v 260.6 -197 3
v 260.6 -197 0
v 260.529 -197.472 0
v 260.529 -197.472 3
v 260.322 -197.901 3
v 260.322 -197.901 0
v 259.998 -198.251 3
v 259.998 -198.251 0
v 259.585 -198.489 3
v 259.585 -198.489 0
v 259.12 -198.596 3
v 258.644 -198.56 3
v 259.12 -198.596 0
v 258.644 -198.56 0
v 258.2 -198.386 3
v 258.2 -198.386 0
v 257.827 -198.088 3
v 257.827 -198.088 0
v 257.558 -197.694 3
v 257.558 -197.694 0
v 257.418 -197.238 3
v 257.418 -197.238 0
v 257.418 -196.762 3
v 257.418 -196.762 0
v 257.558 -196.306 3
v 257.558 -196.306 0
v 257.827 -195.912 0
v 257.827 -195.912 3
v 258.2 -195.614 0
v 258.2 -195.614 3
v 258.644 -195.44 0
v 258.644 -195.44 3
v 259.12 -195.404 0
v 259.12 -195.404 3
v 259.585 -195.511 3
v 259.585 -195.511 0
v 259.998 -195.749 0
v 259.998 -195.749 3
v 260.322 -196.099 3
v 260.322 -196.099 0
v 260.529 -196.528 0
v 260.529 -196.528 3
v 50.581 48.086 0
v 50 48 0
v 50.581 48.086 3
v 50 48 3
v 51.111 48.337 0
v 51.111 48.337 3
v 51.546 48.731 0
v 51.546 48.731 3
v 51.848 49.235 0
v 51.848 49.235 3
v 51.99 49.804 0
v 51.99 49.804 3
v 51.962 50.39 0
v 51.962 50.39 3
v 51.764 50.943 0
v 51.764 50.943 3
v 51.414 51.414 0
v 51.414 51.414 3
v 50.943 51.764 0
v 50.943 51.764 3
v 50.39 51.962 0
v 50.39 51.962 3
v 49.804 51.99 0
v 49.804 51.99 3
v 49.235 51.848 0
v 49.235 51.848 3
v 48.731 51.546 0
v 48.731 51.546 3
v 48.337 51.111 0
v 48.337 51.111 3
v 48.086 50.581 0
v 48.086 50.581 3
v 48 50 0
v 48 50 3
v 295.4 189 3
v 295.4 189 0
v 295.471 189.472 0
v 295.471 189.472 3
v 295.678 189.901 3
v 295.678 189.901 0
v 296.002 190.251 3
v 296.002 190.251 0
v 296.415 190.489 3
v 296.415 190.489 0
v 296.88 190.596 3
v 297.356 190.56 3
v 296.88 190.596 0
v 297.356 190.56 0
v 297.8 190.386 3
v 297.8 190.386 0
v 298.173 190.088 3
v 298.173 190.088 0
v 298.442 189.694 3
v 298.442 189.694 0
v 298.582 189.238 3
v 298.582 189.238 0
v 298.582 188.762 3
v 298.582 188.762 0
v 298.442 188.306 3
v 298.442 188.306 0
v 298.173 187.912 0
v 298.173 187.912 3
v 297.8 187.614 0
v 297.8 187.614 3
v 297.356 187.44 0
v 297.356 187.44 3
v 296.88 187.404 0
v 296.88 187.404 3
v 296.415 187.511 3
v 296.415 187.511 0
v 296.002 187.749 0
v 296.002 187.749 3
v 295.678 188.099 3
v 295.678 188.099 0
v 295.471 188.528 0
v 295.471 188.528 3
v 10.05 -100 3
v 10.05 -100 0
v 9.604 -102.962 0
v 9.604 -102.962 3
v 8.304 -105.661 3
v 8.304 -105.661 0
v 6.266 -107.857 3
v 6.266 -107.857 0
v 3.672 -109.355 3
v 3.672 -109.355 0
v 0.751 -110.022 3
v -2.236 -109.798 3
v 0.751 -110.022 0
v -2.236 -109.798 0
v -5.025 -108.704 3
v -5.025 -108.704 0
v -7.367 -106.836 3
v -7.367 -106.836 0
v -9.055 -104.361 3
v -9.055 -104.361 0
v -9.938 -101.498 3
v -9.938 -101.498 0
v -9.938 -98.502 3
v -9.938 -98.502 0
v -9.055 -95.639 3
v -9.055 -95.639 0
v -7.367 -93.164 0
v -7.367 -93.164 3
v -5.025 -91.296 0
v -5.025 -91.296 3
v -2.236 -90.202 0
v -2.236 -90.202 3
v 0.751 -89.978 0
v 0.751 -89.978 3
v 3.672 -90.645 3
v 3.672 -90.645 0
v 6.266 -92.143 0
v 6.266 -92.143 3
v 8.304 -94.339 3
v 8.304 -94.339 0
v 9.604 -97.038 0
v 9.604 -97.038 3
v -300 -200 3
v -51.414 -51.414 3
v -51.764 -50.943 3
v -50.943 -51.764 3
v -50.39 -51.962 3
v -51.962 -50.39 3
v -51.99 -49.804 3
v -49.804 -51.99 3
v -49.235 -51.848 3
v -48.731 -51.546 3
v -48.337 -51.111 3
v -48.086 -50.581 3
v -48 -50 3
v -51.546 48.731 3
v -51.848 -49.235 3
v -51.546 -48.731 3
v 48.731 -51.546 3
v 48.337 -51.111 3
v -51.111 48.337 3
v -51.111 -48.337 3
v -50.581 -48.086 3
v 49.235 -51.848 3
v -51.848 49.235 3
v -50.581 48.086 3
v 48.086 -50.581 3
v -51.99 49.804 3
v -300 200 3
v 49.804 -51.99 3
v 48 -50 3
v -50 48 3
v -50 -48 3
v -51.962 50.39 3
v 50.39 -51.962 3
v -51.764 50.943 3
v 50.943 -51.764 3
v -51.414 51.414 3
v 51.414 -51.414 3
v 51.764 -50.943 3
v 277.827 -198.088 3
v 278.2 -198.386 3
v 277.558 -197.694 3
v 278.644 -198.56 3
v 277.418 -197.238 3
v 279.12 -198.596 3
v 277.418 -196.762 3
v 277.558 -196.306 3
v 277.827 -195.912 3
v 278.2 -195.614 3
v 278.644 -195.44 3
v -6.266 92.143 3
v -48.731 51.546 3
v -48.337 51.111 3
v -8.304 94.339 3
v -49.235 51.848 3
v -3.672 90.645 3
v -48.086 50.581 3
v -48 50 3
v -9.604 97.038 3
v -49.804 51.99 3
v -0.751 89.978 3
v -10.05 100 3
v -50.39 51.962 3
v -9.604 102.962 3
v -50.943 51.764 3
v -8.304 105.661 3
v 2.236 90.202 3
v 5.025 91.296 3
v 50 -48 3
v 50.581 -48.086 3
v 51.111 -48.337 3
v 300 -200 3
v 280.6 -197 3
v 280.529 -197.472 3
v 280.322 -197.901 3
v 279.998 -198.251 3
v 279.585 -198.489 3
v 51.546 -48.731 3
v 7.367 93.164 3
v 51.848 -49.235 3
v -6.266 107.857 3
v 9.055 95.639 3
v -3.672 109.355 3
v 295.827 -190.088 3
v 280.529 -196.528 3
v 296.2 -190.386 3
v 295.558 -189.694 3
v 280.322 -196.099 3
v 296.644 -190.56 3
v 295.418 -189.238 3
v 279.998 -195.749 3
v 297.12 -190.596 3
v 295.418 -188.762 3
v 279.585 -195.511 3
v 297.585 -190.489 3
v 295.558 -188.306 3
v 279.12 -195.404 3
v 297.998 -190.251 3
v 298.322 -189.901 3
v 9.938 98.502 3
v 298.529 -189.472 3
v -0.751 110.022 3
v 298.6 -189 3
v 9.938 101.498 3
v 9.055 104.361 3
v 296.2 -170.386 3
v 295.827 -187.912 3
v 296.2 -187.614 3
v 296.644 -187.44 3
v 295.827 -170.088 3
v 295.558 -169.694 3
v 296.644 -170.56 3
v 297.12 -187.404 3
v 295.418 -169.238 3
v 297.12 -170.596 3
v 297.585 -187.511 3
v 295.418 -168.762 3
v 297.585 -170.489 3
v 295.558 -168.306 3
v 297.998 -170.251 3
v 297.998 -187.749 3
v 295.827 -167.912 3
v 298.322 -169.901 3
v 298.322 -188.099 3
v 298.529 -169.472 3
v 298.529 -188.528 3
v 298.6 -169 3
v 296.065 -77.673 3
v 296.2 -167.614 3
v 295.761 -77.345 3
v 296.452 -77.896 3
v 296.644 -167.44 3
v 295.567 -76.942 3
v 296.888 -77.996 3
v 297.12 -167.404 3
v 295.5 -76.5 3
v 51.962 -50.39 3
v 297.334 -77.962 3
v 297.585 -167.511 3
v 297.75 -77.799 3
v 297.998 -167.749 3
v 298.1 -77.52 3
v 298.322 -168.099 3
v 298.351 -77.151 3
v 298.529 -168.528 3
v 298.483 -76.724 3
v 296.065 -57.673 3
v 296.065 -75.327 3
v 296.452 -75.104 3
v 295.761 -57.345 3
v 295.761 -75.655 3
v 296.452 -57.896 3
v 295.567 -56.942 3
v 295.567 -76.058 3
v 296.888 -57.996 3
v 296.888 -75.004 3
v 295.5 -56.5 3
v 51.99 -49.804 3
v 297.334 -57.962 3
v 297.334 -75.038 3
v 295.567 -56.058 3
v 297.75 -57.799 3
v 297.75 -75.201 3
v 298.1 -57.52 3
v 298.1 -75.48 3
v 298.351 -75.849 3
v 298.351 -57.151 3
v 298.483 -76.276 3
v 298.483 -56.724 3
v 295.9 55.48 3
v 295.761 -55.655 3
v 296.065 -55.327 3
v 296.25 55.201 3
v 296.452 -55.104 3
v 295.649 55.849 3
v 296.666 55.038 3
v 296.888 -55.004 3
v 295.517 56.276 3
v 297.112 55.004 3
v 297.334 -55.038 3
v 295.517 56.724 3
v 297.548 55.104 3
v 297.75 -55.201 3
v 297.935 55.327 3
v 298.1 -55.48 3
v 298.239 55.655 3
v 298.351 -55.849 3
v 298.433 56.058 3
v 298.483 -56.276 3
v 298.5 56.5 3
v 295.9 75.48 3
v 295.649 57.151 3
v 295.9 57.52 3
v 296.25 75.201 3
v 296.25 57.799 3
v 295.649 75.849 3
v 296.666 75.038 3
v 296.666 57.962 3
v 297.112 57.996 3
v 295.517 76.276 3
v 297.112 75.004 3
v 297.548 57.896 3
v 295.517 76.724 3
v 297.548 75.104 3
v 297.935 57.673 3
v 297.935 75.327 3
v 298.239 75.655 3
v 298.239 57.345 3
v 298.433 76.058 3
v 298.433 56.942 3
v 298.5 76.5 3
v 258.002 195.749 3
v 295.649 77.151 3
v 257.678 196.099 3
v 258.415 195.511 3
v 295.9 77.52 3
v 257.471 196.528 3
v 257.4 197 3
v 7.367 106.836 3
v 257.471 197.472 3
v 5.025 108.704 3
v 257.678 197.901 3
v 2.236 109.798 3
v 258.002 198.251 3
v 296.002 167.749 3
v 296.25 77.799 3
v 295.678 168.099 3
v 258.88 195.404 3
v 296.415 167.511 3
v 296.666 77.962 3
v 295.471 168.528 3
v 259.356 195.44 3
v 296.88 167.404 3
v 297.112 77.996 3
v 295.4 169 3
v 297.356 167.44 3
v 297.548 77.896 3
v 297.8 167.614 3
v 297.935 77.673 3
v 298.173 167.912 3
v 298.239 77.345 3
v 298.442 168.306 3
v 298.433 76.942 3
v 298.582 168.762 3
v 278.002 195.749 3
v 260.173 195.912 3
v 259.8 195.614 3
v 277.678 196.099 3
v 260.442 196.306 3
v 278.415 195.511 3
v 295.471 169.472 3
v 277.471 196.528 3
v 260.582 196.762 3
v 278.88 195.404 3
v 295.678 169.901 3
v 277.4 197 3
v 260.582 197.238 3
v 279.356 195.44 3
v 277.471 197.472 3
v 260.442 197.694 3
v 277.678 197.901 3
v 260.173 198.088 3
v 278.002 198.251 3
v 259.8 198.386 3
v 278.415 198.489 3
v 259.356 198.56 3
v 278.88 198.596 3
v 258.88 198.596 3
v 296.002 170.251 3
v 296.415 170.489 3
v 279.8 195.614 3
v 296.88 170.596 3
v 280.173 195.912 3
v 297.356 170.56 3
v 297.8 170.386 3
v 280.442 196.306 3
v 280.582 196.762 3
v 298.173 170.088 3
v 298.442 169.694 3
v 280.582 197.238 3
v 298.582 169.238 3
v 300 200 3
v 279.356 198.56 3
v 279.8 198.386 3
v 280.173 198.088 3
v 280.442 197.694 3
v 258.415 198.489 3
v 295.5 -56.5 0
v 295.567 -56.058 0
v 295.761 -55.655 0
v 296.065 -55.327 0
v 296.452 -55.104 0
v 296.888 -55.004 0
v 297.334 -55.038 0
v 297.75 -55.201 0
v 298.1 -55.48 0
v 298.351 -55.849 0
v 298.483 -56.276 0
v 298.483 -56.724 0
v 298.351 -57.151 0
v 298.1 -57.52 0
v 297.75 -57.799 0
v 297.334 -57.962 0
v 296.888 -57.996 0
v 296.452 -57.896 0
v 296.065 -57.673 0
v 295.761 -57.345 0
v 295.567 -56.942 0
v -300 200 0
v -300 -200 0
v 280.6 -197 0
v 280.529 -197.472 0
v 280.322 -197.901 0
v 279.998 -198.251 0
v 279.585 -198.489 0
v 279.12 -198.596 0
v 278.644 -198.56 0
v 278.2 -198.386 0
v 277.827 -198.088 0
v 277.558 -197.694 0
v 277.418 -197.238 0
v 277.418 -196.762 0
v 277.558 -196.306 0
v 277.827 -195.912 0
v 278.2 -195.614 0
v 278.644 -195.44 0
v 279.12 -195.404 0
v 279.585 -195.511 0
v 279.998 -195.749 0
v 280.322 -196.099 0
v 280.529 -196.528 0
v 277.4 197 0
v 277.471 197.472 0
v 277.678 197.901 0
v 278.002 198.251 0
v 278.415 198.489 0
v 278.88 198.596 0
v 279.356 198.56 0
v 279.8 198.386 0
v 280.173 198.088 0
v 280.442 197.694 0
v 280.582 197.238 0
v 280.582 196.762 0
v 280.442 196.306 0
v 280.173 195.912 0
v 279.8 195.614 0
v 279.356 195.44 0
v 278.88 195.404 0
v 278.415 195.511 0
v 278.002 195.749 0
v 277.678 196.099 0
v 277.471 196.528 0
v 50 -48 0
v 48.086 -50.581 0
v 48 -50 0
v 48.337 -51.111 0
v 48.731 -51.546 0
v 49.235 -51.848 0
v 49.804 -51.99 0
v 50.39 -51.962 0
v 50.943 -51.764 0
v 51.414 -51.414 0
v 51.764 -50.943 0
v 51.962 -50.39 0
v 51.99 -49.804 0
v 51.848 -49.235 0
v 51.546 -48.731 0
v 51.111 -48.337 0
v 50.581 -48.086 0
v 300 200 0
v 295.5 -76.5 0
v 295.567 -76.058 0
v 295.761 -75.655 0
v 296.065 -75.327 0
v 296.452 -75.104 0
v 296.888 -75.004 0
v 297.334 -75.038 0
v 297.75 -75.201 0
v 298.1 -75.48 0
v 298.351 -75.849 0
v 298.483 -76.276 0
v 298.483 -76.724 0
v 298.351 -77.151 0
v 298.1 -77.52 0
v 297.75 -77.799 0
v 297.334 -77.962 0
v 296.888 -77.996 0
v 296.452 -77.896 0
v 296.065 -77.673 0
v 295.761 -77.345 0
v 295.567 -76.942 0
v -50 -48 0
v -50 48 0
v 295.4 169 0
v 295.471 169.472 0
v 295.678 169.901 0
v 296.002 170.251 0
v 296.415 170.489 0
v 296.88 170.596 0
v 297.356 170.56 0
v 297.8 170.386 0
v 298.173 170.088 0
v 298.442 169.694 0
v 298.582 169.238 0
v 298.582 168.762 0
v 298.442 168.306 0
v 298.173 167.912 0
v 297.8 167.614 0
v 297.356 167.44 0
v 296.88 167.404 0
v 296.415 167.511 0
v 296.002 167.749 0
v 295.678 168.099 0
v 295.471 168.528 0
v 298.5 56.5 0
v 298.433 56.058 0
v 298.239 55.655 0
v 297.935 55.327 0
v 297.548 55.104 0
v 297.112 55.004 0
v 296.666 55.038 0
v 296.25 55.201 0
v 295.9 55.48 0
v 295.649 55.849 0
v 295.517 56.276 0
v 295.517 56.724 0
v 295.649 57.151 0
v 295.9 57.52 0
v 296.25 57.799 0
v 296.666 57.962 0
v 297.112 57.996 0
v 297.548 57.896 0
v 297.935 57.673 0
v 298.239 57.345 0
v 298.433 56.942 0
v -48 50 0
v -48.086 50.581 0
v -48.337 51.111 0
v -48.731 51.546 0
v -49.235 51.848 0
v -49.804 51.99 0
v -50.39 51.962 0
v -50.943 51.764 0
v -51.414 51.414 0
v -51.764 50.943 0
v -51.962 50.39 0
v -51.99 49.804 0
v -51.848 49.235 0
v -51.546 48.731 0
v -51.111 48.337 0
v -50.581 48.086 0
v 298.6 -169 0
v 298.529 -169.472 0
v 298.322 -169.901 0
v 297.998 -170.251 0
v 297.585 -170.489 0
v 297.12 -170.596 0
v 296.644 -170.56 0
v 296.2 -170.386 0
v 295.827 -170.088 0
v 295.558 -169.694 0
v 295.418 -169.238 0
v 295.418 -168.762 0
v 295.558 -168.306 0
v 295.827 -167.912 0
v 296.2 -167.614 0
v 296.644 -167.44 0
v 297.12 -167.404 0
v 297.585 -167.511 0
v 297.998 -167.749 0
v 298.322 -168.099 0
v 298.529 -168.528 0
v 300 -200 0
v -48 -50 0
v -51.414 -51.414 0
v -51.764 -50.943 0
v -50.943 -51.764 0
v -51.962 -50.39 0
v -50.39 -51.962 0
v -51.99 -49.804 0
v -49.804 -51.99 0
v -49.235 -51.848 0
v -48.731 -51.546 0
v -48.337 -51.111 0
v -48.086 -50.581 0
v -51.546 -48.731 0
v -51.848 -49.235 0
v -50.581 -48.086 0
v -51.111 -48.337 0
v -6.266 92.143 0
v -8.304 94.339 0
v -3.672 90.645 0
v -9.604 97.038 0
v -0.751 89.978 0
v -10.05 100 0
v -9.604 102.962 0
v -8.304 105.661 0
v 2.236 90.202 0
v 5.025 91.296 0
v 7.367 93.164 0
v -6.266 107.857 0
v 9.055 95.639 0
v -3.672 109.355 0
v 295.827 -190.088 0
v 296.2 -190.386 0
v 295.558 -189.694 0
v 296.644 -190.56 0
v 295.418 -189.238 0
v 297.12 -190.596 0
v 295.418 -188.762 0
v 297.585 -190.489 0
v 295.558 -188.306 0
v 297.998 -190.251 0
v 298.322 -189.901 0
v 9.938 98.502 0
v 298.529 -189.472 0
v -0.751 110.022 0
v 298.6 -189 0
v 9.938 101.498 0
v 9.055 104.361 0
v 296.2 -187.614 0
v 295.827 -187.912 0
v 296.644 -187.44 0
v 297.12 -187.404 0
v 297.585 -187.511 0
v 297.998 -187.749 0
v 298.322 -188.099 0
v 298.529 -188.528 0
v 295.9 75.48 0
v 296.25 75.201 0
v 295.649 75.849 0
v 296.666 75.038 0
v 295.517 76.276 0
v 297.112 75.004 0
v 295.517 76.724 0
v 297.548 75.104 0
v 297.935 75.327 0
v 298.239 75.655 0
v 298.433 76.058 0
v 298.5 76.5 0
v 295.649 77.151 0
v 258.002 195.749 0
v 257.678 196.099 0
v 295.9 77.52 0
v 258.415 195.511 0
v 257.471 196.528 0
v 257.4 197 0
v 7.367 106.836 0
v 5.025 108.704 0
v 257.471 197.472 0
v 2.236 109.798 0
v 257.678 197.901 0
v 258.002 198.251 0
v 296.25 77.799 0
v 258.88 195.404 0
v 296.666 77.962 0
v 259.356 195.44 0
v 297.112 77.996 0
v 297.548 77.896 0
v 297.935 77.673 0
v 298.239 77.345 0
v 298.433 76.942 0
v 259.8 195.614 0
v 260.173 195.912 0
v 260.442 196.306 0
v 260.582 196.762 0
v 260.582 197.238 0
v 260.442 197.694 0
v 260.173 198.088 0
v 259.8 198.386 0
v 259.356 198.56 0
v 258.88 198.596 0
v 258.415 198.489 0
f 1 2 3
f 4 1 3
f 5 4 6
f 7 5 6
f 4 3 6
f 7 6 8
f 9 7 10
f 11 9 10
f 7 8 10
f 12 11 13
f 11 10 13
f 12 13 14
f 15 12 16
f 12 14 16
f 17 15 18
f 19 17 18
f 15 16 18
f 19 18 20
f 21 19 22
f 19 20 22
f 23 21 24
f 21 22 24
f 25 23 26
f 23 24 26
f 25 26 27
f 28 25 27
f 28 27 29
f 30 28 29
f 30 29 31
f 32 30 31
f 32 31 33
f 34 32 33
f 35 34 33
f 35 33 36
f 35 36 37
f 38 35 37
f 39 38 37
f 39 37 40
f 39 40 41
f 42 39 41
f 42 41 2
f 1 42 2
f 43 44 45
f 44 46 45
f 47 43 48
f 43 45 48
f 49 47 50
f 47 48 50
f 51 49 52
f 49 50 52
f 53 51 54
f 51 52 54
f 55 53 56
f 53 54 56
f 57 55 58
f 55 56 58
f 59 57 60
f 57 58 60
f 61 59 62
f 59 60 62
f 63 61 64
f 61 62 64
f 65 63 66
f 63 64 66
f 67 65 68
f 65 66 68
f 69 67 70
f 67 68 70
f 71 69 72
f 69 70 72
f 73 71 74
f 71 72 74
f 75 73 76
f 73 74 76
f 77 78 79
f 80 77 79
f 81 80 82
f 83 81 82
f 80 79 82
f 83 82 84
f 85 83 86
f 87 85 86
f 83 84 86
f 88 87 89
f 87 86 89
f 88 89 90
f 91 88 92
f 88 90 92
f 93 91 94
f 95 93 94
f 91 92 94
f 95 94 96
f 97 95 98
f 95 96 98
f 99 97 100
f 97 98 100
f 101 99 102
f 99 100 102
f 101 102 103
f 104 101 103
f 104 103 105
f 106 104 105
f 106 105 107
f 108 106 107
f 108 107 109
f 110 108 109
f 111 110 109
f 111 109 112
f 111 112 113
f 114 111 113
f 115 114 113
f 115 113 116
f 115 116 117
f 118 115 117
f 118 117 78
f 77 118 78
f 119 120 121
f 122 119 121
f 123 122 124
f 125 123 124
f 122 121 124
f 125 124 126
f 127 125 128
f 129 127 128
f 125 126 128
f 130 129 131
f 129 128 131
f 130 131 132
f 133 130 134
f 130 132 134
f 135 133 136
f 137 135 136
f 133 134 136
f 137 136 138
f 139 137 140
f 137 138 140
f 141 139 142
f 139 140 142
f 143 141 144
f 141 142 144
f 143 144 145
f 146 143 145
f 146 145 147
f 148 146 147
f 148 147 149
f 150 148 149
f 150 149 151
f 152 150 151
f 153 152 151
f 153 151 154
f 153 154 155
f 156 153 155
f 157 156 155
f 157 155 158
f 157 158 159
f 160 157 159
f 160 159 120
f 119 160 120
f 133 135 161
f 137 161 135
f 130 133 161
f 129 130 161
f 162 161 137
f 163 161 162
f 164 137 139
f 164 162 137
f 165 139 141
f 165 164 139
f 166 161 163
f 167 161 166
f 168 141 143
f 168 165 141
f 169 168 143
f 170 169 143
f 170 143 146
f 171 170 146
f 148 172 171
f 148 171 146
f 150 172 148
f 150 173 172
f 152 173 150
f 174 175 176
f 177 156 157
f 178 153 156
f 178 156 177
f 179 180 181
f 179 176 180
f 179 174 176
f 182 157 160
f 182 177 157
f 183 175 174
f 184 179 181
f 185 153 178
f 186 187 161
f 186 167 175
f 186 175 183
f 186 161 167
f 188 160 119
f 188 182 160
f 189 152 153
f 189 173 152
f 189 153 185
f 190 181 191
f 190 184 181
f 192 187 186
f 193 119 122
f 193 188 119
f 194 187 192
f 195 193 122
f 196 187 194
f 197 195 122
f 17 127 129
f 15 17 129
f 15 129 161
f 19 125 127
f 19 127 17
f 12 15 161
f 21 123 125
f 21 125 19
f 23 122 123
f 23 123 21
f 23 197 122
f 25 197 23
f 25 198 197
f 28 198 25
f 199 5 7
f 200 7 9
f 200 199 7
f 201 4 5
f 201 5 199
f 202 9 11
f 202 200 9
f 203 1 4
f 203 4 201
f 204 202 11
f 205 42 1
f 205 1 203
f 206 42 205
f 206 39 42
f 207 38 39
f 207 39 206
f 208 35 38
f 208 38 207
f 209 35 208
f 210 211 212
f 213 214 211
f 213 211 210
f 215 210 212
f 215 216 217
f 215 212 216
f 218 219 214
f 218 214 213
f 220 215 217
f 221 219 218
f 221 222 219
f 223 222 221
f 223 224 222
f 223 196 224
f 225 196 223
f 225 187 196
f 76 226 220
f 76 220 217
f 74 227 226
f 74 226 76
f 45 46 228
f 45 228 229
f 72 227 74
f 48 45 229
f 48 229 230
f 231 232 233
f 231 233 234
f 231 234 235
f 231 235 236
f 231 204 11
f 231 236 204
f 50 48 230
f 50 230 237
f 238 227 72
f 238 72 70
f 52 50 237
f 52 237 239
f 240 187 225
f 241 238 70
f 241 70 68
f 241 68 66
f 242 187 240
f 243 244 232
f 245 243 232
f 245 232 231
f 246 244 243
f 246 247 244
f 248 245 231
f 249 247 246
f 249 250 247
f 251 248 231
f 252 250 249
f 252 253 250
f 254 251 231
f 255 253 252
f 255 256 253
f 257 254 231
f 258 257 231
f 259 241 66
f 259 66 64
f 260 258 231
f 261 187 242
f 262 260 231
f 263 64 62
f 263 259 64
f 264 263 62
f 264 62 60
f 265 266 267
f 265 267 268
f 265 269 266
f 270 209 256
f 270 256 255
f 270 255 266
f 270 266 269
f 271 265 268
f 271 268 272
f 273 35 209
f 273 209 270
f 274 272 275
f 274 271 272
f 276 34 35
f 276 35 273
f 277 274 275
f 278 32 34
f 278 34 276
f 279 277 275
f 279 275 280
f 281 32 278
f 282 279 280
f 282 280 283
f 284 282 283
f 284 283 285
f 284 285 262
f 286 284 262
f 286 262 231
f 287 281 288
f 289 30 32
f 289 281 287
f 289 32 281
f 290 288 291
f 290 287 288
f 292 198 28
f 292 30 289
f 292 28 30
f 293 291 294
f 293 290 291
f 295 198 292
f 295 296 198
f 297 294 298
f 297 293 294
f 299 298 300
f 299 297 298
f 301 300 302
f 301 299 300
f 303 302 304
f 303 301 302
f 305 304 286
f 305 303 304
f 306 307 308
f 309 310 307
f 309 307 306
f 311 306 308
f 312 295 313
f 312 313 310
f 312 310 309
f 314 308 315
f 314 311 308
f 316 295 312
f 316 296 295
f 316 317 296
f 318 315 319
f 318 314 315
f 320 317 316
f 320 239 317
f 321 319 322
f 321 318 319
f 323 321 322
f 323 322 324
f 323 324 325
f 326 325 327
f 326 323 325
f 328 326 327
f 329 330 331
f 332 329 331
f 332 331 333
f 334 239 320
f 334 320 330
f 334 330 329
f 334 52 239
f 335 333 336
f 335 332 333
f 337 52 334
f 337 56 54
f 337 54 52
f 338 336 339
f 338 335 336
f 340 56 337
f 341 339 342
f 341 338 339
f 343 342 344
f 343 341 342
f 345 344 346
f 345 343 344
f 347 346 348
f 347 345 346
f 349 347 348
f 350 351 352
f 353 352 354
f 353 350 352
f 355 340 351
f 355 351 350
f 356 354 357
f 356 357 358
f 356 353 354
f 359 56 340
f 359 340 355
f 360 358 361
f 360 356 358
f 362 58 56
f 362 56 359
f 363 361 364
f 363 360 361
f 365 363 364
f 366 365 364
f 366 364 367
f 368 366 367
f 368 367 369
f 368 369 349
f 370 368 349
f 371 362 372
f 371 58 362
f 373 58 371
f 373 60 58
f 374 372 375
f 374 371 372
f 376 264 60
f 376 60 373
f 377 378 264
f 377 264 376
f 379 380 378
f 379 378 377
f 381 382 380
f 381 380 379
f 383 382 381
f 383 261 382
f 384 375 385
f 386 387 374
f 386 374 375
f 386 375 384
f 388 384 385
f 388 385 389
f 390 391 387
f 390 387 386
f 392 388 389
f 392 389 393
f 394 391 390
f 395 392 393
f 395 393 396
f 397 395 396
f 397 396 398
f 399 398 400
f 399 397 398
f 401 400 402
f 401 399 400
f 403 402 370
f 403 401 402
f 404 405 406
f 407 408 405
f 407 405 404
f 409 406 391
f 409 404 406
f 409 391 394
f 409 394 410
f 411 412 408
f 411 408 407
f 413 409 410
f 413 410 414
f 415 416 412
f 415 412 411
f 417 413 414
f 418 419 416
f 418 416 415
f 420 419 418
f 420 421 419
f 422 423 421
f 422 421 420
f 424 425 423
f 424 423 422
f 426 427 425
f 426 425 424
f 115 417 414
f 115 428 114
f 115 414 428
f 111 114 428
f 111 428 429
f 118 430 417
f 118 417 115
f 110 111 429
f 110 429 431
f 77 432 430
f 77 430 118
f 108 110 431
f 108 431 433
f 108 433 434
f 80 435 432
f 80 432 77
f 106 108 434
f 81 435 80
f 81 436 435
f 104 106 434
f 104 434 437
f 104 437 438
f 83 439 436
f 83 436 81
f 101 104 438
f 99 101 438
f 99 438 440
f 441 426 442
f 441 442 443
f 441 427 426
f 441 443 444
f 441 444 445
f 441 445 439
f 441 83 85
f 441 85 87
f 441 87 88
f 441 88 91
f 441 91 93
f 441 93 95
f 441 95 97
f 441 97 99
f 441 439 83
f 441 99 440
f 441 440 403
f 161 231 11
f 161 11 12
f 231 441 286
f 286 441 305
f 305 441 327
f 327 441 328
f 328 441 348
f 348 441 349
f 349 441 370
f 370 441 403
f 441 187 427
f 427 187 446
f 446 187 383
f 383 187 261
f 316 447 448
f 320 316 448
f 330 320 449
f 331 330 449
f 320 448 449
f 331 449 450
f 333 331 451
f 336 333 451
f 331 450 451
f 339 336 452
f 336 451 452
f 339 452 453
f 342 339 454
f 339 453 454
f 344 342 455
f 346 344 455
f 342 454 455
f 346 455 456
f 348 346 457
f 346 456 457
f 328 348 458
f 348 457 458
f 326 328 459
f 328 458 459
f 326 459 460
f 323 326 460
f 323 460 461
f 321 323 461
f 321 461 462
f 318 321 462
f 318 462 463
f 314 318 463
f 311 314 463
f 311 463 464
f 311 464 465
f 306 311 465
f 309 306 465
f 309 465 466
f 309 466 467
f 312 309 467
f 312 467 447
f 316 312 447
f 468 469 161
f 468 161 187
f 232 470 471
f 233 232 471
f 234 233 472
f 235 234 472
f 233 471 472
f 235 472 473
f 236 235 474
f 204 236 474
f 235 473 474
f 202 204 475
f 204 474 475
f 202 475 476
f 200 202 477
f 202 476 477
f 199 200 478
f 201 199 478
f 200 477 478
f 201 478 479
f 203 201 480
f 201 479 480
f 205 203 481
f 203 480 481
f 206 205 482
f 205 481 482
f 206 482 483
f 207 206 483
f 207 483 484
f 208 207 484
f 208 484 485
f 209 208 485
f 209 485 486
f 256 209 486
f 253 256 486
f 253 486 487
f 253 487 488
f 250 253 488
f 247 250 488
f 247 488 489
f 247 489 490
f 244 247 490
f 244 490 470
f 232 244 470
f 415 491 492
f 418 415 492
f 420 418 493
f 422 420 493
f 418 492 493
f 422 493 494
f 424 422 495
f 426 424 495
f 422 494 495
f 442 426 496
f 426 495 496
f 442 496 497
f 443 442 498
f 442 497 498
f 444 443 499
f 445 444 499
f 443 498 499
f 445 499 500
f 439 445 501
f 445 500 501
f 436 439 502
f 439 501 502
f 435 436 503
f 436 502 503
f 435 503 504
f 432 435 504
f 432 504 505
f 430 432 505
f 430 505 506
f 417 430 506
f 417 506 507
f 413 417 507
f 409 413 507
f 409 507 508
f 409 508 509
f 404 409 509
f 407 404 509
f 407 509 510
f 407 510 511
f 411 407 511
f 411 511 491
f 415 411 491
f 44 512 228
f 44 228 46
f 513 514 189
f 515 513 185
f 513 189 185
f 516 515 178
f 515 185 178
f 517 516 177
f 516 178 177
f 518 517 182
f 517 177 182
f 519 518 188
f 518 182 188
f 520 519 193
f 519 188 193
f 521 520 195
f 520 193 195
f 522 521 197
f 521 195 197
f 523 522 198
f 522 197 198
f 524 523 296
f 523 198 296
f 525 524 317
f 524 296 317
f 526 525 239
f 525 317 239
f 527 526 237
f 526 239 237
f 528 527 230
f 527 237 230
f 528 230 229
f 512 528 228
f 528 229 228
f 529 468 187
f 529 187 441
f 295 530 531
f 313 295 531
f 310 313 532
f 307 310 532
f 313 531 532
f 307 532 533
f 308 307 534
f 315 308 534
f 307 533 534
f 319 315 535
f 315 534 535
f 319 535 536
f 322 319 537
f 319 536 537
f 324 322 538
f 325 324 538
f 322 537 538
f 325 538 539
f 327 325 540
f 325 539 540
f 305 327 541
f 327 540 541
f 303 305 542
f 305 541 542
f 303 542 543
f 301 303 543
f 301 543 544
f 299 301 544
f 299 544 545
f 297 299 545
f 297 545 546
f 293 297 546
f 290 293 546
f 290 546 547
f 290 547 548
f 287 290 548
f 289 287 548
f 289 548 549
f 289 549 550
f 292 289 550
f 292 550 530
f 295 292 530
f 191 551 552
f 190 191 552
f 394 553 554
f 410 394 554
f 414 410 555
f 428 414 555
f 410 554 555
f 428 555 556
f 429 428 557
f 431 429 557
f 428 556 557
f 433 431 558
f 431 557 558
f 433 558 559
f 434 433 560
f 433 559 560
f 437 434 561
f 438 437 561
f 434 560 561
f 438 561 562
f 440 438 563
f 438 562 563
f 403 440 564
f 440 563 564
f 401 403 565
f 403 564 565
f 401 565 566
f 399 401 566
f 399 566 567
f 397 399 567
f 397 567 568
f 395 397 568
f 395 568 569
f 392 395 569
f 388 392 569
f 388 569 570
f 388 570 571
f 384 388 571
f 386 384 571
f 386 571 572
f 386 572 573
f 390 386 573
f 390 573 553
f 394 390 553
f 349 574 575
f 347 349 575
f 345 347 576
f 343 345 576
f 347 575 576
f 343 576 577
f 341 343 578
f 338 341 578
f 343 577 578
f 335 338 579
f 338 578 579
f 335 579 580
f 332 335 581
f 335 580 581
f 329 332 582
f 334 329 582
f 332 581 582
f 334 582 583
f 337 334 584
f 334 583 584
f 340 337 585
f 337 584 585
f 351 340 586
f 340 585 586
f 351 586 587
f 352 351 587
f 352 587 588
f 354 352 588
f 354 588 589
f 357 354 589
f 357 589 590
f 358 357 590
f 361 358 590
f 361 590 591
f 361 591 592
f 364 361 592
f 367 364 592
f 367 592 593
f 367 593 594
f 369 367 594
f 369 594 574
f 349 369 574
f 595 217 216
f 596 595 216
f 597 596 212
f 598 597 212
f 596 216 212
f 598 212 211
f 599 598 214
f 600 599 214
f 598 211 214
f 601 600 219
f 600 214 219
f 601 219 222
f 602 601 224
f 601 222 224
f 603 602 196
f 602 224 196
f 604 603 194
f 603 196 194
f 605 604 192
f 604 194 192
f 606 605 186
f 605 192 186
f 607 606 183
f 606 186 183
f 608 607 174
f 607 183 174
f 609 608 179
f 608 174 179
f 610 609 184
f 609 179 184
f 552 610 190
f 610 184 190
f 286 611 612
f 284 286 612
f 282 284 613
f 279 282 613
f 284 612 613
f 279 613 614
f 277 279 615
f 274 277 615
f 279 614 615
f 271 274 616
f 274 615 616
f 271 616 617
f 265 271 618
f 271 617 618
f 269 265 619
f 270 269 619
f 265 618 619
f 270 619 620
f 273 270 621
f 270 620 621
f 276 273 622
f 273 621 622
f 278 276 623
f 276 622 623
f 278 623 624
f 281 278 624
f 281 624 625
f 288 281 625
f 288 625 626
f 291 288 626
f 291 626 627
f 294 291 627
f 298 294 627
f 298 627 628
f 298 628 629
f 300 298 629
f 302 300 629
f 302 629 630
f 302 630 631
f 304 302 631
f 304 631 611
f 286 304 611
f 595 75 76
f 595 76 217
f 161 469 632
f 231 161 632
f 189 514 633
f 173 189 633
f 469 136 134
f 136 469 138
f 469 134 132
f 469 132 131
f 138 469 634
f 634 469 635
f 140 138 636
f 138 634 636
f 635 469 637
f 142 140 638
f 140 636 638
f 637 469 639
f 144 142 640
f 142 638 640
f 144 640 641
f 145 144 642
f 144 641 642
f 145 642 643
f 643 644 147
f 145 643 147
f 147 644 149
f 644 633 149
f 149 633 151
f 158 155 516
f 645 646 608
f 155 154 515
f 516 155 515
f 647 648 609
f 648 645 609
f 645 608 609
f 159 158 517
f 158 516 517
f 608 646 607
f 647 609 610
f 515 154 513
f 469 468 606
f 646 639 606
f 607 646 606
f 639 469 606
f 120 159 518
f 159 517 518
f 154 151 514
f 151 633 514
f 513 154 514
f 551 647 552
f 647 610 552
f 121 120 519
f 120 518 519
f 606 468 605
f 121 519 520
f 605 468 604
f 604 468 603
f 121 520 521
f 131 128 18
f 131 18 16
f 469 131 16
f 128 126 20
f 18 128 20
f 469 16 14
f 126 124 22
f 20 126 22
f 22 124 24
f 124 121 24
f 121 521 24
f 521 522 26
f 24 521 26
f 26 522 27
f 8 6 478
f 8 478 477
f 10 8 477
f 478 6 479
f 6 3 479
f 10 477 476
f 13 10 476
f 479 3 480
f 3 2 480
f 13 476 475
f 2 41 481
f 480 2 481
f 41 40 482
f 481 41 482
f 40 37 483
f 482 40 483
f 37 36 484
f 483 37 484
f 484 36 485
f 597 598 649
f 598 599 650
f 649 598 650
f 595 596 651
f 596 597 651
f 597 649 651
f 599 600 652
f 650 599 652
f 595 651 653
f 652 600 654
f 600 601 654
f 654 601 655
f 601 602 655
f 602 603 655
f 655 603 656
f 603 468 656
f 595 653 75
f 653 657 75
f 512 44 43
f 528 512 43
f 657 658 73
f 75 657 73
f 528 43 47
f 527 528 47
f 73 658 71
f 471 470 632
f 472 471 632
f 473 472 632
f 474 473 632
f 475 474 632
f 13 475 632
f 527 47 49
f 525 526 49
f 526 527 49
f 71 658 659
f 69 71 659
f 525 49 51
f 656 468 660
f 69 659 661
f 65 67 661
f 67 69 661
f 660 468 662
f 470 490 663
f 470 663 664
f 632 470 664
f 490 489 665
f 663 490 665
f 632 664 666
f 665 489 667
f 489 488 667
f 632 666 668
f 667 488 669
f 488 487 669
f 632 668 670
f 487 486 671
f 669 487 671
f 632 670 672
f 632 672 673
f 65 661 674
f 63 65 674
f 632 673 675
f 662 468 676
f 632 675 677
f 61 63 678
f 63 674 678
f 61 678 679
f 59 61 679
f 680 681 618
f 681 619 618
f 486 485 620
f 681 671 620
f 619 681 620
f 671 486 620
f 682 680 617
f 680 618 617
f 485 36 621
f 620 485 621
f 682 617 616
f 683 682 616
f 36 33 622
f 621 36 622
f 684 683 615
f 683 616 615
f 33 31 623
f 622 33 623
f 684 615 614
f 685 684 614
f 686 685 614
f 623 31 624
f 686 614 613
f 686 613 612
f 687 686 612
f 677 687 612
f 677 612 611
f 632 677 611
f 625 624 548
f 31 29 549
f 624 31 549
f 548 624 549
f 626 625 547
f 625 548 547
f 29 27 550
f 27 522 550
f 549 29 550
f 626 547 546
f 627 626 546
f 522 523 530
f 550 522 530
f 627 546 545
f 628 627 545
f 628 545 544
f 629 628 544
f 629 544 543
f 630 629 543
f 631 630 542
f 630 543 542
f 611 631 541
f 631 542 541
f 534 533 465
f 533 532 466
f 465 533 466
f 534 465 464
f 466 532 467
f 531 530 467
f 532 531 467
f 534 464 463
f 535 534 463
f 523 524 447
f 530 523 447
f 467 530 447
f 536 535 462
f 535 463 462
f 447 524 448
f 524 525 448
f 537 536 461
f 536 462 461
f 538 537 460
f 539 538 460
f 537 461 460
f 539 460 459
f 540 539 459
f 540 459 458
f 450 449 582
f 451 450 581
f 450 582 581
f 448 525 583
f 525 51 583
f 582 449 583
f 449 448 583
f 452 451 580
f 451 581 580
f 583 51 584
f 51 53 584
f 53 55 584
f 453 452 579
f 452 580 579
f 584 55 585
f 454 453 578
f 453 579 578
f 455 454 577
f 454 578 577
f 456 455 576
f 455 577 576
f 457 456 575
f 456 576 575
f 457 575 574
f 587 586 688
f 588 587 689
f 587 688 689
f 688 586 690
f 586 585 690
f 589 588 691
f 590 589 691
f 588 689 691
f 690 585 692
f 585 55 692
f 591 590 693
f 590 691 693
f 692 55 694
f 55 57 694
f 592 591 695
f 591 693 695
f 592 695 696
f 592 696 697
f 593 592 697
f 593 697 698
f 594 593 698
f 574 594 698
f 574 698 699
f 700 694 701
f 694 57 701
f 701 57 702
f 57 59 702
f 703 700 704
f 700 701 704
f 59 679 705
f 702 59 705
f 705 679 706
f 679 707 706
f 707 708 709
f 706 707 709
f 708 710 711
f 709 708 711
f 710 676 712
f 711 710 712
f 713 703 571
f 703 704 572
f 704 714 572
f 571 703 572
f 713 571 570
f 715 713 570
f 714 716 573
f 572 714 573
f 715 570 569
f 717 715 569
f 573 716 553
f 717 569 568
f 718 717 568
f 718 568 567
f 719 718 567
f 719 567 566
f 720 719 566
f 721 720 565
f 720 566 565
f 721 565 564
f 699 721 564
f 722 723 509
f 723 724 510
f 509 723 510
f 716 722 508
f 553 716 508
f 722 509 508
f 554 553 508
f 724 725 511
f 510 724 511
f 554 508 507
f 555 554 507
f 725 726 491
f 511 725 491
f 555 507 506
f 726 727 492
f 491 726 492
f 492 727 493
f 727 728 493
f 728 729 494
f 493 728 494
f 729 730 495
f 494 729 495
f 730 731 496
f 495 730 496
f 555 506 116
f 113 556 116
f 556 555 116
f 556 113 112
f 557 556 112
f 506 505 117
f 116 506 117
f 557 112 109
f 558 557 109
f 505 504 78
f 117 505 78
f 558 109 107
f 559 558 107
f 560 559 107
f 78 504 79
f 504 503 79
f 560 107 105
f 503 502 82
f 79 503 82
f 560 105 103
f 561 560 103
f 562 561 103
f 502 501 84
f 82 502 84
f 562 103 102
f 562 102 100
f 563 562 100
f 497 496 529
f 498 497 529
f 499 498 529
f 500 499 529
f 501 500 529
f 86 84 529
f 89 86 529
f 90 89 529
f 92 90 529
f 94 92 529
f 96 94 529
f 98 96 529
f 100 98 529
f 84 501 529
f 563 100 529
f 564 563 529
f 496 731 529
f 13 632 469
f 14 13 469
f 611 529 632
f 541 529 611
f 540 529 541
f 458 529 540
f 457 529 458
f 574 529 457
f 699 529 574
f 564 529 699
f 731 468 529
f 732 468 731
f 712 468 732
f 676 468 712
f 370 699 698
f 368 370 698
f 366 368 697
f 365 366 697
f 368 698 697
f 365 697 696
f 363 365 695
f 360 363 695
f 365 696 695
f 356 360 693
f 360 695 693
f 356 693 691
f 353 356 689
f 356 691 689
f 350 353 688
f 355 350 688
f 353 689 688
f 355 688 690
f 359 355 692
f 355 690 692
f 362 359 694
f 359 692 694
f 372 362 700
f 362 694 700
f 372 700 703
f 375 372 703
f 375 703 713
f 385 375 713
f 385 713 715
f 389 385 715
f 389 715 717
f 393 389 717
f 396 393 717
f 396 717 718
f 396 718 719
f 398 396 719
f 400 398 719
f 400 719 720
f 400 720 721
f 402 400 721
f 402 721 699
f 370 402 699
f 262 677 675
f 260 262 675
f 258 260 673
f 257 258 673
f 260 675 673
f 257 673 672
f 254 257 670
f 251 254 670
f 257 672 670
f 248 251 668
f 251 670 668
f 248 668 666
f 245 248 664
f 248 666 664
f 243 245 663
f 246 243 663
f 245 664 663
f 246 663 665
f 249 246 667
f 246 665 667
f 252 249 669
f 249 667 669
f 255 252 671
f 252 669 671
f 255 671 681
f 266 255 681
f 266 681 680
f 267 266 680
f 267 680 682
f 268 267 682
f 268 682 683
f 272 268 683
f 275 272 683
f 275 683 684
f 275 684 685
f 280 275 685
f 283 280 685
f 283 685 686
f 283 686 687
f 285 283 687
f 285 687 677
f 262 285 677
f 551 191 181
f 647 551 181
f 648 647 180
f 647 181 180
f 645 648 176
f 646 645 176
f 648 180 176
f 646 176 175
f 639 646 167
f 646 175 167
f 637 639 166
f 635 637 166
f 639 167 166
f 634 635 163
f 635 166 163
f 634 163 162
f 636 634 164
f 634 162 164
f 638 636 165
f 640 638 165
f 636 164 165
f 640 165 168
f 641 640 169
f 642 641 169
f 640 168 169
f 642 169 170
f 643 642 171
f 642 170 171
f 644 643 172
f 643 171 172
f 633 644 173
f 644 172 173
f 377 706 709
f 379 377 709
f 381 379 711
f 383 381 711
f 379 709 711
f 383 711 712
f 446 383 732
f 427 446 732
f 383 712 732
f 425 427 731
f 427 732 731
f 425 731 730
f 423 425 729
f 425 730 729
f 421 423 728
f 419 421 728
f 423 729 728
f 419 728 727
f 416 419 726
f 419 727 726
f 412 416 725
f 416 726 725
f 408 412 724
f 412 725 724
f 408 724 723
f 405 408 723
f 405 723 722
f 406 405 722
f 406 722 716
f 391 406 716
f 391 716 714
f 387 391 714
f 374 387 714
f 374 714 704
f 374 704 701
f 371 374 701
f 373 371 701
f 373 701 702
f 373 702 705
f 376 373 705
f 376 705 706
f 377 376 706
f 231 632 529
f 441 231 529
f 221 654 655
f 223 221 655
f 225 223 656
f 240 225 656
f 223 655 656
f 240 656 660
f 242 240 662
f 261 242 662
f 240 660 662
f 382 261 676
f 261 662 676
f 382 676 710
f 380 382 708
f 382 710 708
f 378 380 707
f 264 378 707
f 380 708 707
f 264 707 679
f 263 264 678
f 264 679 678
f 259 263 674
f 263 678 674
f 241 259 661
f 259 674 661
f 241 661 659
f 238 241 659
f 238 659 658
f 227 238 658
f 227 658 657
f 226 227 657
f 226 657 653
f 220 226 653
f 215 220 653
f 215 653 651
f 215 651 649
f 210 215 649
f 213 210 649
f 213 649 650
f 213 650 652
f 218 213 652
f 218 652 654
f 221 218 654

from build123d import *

# Parameters (mm, degrees)
SKETCH_1_W          = 600
SKETCH_1_H          = 400
EXTRUDE_1_DEPTH     = 3
SKETCH_3_W          = 100
SKETCH_3_H          = 100
CUT_EXTRUDE_1_DEPTH = 361.567608085
SKETCH_4_R          = 2
CUT_EXTRUDE_2_DEPTH = 361.567608085
SKETCH_5_R          = 1.6
CUT_EXTRUDE_3_DEPTH = 361.567608085
SKETCH_6_R          = 10.05
CUT_EXTRUDE_4_DEPTH = 361.567608085
SKETCH_7_R          = 1.5
CUT_EXTRUDE_5_DEPTH = 361.567608085


with BuildPart() as part:
    # 草图1 → 凸台-拉伸1 (new body)
    with BuildSketch(Plane.XY):
        Rectangle(SKETCH_1_W, SKETCH_1_H)
    extrude(amount=EXTRUDE_1_DEPTH)

    # 草图3 → 切除-拉伸1 (cut, through all)
    with BuildSketch(Plane(origin=(0, 0, 0), x_dir=(-1, 0, 0), z_dir=(0, 0, -1))):
        Rectangle(SKETCH_3_W, SKETCH_3_H)
    extrude(amount=-CUT_EXTRUDE_1_DEPTH, mode=Mode.SUBTRACT)

    # 草图4 → 切除-拉伸2 (cut, through all)
    with BuildSketch(Plane.XY.offset(3)):
        with Locations((-50, 50)):
            Circle(SKETCH_4_R)
        with Locations((-50, -50)):
            Circle(SKETCH_4_R)
        with Locations((50, -50)):
            Circle(SKETCH_4_R)
        with Locations((50, 50)):
            Circle(SKETCH_4_R)
    extrude(amount=-CUT_EXTRUDE_2_DEPTH, mode=Mode.SUBTRACT)

    # 草图5 → 切除-拉伸3 (cut, through all)
    with BuildSketch(Plane(origin=(0, 0, 0), x_dir=(-1, 0, 0), z_dir=(0, 0, -1))):
        with Locations((-297, 169)):
            Circle(SKETCH_5_R)
        with Locations((-297, 189)):
            Circle(SKETCH_5_R)
        with Locations((-279, 197)):
            Circle(SKETCH_5_R)
        with Locations((-259, 197)):
            Circle(SKETCH_5_R)
        with Locations(Location((-259, -197, 0), (0, 0, 180))):
            Circle(SKETCH_5_R)
        with Locations(Location((-279, -197, 0), (0, 0, 180))):
            Circle(SKETCH_5_R)
        with Locations(Location((-297, -189, 0), (0, 0, 180))):
            Circle(SKETCH_5_R)
        with Locations(Location((-297, -169, 0), (0, 0, 180))):
            Circle(SKETCH_5_R)
    extrude(amount=-CUT_EXTRUDE_3_DEPTH, mode=Mode.SUBTRACT)

    # 草图6 → 切除-拉伸4 (cut, through all)
    with BuildSketch(Plane(origin=(0, 0, 0), x_dir=(-1, 0, 0), z_dir=(0, 0, -1))):
        with Locations((0, 100)):
            Circle(SKETCH_6_R)
        with Locations(Location((0, -100, 0), (0, 0, 180))):
            Circle(SKETCH_6_R)
    extrude(amount=-CUT_EXTRUDE_4_DEPTH, mode=Mode.SUBTRACT)

    # 草图7 → 切除-拉伸5 (cut, through all)
    with BuildSketch(Plane(origin=(0, 0, 0), x_dir=(-1, 0, 0), z_dir=(0, 0, -1))):
        with Locations((-297, -56.5)):
            Circle(SKETCH_7_R)
        with Locations((-297, -76.5)):
            Circle(SKETCH_7_R)
        with Locations(Location((-297, 76.5, 0), (0, 0, 180))):
            Circle(SKETCH_7_R)
        with Locations(Location((-297, 56.5, 0), (0, 0, 180))):
            Circle(SKETCH_7_R)
    extrude(amount=-CUT_EXTRUDE_5_DEPTH, mode=Mode.SUBTRACT)


solid = part.part
